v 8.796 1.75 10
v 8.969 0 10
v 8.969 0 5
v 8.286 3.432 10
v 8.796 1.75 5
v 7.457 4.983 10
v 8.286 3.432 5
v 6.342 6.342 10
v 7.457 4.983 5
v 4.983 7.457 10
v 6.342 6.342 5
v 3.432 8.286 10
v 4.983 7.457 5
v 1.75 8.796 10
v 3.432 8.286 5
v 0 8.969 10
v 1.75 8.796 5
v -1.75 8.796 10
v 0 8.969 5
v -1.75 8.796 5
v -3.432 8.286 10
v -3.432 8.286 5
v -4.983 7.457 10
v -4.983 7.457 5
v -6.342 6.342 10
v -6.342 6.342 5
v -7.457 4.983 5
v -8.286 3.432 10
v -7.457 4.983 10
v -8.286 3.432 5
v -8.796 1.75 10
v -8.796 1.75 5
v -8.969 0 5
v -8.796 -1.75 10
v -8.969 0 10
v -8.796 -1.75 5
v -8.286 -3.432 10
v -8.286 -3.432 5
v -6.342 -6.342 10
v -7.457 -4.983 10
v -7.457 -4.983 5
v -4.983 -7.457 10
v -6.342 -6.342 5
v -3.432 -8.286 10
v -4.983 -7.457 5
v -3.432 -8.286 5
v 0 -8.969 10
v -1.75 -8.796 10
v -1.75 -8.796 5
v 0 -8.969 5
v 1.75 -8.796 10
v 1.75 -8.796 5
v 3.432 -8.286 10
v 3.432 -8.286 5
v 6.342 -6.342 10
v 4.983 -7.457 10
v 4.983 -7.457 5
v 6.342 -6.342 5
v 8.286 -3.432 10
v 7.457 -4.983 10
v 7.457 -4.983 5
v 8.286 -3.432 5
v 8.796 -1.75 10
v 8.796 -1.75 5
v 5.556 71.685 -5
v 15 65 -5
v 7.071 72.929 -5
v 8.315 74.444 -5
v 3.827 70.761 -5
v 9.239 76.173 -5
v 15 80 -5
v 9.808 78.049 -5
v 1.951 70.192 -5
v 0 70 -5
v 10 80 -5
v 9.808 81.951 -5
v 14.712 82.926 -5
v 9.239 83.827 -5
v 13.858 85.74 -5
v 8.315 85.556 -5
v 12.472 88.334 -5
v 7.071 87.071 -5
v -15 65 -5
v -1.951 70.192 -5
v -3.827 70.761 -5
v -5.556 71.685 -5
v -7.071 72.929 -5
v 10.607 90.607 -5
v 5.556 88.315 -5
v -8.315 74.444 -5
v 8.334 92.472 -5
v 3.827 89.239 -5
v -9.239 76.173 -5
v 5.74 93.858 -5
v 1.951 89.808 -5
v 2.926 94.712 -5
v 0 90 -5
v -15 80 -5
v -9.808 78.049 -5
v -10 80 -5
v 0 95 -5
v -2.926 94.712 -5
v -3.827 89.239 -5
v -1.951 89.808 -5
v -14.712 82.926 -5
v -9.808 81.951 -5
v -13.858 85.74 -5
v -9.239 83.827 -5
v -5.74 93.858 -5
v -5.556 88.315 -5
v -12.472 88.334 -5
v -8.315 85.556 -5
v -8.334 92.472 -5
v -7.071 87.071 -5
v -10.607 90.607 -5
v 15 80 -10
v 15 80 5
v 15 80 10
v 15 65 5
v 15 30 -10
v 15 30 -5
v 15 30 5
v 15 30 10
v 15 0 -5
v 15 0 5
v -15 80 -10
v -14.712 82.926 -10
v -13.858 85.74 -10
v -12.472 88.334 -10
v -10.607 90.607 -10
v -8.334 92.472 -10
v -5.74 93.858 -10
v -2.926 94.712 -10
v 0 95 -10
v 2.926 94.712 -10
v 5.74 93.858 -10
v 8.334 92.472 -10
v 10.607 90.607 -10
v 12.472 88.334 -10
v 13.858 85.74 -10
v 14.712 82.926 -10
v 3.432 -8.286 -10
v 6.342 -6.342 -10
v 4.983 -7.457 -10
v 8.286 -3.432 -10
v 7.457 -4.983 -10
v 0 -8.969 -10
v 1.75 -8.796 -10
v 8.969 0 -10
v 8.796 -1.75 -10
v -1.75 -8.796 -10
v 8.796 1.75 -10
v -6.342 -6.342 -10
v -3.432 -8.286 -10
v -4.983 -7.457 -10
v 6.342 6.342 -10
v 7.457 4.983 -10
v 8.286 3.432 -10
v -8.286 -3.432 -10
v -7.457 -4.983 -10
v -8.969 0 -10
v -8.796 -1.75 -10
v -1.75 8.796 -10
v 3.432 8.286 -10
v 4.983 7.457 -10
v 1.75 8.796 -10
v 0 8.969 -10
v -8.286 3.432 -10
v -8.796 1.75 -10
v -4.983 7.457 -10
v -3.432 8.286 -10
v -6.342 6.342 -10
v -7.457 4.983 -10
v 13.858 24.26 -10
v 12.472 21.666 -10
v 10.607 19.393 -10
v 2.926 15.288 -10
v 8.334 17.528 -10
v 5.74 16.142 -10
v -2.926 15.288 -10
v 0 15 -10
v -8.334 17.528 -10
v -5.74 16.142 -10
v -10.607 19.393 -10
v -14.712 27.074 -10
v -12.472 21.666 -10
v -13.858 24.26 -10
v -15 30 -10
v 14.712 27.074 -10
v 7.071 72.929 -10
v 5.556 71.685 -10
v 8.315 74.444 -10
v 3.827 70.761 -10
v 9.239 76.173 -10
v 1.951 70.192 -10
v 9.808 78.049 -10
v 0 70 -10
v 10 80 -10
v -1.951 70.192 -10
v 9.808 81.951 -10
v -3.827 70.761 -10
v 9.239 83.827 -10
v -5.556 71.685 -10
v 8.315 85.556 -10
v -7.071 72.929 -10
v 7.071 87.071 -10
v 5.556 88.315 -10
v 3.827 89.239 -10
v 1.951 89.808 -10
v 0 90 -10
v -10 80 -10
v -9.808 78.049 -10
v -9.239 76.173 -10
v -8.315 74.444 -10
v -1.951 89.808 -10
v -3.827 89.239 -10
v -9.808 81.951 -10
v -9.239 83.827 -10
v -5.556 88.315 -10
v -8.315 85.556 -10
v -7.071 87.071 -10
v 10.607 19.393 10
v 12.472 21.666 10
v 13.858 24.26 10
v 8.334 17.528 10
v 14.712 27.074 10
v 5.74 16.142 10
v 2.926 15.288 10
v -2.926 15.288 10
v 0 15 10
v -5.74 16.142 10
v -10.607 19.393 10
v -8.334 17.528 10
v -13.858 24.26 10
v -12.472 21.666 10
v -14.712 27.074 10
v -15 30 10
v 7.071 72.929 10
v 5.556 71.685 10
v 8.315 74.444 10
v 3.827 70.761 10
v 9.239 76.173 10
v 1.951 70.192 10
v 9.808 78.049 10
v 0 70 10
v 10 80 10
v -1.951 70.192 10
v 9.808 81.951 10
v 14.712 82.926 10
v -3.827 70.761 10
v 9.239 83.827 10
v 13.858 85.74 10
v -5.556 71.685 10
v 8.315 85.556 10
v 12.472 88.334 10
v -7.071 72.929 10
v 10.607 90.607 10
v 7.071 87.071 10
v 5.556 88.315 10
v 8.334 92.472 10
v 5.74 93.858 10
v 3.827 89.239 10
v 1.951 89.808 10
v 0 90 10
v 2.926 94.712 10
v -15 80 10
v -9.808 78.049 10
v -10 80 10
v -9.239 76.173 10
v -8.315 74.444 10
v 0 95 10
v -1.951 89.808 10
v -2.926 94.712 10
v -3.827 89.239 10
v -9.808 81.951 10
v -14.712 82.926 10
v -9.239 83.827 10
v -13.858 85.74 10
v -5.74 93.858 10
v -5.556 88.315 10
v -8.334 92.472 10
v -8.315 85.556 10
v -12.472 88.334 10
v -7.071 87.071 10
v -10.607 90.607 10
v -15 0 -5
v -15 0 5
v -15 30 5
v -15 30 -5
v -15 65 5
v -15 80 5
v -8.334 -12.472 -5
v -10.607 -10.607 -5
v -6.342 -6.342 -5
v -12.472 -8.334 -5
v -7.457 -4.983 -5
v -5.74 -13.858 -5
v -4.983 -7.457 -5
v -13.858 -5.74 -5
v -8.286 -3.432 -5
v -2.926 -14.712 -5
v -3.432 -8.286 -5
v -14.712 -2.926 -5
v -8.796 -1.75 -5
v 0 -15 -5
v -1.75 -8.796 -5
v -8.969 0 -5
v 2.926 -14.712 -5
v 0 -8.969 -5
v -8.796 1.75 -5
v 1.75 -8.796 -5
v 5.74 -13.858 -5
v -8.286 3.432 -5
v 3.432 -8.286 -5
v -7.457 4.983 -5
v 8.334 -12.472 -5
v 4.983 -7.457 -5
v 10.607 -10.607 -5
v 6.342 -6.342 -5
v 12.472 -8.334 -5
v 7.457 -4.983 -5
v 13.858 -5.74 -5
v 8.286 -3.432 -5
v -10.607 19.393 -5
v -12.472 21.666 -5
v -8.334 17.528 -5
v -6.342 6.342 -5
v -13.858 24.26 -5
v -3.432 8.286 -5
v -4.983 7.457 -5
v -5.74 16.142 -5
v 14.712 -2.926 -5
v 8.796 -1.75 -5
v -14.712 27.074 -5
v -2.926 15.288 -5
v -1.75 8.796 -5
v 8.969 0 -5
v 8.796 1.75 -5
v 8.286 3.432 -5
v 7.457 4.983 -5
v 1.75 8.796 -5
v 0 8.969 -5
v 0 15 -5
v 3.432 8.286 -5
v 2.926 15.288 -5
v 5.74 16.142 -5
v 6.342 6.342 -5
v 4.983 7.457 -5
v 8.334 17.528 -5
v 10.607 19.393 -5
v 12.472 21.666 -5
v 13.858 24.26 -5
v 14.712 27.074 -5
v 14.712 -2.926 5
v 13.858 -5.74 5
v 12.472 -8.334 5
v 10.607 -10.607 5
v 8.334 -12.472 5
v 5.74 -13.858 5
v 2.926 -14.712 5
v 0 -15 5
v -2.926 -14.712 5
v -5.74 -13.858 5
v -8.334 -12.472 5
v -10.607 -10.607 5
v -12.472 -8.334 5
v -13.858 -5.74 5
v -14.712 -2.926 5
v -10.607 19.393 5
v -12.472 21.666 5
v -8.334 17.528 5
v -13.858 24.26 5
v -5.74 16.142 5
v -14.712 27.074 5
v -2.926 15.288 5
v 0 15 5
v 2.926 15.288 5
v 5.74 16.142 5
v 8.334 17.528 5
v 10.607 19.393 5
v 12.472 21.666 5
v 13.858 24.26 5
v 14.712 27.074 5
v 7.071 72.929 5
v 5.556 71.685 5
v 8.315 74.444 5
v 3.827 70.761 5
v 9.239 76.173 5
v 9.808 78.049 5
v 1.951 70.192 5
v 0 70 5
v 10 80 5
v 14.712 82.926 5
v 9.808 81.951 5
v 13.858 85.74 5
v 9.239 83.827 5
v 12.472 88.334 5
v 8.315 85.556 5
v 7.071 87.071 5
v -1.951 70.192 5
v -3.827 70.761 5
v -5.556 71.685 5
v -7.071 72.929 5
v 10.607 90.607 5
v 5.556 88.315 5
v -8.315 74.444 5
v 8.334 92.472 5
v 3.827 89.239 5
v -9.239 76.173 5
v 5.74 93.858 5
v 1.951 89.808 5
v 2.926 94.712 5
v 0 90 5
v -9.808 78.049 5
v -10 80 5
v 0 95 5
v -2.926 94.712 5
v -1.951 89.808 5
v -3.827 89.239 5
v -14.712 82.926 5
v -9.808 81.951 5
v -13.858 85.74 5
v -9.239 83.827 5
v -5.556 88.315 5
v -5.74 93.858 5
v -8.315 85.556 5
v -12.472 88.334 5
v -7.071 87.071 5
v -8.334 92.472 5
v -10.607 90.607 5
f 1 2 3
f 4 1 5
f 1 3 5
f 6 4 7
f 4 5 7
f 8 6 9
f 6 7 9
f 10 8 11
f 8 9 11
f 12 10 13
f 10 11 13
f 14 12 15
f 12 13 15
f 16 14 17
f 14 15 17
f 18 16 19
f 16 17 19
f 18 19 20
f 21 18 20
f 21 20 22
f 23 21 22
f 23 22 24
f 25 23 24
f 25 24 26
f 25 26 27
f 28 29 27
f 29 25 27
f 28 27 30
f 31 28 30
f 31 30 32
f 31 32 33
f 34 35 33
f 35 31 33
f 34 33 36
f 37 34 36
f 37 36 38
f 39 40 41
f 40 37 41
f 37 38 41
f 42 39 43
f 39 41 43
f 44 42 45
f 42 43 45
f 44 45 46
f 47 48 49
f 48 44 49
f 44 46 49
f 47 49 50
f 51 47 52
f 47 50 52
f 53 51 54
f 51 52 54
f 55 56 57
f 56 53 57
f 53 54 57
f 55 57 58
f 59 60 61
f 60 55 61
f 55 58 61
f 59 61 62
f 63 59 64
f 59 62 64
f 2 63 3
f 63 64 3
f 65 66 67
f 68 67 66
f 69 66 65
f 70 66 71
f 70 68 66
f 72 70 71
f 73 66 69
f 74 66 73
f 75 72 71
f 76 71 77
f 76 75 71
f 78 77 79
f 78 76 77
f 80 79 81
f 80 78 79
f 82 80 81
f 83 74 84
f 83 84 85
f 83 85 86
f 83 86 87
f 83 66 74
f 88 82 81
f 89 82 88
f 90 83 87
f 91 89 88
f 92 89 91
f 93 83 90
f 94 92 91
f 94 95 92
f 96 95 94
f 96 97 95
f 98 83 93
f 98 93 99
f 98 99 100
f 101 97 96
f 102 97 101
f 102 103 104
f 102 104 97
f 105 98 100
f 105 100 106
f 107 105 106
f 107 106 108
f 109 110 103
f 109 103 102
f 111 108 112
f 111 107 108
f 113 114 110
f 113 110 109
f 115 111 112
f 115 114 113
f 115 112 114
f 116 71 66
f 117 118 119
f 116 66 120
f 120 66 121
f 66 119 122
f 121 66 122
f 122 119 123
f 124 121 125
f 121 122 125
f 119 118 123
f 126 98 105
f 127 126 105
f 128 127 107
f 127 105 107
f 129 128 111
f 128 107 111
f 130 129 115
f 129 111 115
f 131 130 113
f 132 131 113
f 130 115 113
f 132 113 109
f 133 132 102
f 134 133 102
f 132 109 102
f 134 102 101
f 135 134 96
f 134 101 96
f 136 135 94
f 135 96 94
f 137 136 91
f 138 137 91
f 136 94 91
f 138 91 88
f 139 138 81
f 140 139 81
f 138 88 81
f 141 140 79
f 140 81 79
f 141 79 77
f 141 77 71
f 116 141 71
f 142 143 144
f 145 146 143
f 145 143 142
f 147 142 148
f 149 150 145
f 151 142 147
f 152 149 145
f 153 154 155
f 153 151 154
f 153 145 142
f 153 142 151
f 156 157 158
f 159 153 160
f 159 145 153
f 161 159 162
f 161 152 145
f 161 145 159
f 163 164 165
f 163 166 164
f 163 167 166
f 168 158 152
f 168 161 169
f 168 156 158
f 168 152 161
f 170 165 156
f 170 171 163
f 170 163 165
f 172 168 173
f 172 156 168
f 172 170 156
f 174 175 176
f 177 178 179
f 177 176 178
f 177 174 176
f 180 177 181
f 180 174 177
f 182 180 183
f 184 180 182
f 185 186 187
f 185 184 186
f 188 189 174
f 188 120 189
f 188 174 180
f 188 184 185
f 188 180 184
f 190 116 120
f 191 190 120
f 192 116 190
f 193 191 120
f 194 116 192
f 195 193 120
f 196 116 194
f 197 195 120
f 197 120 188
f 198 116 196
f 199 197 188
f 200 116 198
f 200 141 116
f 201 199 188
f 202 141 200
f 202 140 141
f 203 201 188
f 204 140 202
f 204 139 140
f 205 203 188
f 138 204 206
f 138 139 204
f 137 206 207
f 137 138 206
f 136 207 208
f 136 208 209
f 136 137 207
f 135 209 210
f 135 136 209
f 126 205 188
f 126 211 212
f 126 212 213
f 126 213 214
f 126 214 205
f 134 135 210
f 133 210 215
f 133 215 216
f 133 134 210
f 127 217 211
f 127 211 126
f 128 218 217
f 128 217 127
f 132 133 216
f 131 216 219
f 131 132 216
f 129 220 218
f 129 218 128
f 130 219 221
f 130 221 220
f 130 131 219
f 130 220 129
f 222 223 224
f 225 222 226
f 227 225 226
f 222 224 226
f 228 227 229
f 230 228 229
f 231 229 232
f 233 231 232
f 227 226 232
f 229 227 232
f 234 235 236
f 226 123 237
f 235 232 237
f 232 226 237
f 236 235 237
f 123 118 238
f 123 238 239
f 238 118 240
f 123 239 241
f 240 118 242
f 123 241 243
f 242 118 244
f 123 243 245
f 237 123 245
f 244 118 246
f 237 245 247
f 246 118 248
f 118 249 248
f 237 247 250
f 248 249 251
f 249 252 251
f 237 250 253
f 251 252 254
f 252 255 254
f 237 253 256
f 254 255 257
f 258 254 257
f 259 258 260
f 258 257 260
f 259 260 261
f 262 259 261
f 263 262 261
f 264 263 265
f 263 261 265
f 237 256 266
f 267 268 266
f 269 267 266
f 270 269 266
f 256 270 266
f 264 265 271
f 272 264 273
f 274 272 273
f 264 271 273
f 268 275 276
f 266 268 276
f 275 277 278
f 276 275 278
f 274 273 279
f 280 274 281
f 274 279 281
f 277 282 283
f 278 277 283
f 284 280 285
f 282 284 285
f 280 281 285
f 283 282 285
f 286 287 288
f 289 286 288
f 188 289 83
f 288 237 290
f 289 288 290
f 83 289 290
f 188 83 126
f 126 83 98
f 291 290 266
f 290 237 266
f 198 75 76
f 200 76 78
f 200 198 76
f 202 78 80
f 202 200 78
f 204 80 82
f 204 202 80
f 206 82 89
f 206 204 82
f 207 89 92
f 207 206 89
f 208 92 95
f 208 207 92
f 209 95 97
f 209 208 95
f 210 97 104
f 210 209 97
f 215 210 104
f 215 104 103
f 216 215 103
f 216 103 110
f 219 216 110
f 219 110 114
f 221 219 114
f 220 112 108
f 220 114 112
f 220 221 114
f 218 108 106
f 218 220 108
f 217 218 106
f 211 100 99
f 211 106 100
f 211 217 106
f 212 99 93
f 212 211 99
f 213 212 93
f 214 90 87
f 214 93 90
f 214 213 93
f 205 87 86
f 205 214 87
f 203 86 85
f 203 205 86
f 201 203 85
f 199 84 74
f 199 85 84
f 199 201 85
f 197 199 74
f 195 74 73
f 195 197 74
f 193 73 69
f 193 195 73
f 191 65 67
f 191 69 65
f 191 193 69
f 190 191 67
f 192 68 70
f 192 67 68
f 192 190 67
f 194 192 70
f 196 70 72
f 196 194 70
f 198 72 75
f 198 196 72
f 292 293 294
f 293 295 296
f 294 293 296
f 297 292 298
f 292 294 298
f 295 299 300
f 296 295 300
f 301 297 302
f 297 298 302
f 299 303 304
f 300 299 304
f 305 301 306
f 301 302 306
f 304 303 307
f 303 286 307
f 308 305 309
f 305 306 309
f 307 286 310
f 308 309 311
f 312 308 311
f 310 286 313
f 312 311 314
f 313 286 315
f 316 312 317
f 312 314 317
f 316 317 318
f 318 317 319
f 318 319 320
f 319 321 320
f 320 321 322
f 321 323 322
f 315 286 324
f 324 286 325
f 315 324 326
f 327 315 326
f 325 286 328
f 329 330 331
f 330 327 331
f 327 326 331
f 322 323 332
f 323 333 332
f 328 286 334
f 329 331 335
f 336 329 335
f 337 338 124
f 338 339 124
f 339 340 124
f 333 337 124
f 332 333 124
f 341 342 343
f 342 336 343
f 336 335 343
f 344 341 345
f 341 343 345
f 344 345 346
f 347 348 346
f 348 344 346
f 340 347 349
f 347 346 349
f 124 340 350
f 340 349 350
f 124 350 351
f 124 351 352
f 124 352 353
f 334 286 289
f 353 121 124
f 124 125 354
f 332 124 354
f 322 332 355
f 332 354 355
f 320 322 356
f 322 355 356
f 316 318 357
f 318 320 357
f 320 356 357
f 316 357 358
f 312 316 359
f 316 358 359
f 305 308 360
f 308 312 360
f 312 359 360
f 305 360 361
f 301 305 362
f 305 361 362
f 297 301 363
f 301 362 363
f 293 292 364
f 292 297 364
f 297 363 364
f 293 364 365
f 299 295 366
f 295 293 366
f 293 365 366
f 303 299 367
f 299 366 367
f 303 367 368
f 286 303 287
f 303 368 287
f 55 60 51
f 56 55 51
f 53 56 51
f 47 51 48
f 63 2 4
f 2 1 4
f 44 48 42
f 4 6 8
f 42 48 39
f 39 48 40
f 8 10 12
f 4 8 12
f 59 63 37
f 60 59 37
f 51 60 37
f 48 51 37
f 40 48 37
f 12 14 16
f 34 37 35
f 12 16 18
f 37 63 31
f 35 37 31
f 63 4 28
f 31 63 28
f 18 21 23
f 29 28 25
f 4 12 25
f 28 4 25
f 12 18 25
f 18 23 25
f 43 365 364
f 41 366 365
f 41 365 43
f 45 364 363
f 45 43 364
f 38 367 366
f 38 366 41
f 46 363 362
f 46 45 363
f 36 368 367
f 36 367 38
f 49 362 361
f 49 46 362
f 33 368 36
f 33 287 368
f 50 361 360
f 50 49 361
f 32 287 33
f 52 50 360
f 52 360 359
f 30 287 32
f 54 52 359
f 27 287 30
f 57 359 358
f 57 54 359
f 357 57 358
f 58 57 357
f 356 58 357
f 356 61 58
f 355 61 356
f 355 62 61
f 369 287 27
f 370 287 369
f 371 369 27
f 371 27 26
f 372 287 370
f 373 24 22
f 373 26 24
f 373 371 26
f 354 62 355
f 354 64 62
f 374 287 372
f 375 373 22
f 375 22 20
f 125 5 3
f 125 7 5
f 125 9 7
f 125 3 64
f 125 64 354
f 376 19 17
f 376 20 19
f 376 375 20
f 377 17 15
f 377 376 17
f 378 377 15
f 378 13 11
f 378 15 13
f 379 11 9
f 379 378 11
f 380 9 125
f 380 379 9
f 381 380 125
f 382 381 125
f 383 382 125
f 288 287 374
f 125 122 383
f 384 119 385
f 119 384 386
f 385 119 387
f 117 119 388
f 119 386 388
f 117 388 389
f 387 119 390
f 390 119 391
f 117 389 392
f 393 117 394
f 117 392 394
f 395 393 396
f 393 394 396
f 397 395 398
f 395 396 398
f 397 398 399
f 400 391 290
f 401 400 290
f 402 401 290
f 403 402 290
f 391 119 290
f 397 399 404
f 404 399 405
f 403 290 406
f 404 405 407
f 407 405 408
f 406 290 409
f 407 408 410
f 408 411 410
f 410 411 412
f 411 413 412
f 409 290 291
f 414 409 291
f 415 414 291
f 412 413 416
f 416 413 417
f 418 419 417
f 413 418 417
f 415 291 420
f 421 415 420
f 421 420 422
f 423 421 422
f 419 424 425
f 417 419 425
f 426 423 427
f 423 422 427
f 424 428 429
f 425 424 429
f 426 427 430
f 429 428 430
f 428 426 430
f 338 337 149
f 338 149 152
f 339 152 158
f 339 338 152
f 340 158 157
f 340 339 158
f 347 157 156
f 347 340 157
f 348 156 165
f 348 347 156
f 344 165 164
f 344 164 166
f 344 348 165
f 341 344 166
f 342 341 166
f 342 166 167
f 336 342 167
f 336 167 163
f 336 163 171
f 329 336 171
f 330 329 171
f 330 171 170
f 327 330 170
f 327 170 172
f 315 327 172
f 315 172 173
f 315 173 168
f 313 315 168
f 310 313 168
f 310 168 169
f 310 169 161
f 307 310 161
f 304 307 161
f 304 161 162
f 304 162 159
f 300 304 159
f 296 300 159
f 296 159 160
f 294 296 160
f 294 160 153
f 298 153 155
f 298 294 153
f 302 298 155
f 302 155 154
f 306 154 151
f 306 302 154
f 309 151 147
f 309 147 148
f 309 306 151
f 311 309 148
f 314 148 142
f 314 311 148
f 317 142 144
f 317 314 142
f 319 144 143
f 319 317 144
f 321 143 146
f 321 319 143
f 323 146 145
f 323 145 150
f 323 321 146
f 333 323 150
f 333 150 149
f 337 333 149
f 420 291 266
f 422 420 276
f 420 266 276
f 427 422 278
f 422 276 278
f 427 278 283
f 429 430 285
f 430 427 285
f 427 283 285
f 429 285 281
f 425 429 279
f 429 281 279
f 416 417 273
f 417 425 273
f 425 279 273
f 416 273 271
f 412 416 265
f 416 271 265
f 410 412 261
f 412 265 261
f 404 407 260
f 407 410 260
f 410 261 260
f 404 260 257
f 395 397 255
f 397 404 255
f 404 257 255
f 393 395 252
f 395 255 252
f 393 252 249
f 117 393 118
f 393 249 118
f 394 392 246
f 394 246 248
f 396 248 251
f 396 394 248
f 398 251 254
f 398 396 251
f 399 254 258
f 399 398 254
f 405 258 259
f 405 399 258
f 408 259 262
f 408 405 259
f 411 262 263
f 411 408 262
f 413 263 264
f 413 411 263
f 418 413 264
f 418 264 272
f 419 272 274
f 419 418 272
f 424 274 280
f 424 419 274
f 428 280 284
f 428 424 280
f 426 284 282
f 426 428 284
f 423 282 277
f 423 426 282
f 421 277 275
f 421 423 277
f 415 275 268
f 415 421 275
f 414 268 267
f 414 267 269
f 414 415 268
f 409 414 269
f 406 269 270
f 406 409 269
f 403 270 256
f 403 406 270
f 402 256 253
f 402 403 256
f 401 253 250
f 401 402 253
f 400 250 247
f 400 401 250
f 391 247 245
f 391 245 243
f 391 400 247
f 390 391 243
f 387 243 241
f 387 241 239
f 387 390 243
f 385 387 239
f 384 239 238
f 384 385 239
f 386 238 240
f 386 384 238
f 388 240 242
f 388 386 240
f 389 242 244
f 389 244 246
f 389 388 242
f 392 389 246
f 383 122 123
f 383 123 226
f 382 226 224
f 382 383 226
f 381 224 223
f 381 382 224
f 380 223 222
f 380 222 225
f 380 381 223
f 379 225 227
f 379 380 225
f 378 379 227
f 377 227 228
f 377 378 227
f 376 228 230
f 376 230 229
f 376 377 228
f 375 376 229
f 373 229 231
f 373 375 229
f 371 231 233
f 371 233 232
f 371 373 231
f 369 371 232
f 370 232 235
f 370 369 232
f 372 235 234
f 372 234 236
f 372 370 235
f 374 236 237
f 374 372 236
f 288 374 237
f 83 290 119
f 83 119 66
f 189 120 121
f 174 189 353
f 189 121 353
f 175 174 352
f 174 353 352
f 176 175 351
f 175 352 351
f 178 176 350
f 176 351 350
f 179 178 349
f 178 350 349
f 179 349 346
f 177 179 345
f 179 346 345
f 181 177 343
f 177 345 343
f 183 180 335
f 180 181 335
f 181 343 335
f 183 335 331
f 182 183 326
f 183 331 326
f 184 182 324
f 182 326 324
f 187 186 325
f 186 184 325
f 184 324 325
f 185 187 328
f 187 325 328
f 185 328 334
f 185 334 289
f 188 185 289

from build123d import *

# Parameters (mm, degrees)
CROQUIS1_R                 = 10
SALIENTE_EXTRUIR1_DEPTH    = 10
CORTAR_EXTRUIR2_DEPTH      = 97.695398029
CORTAR_EXTRUIR2_DEPTH_BACK = 97.695398029
CROQUIS2_W                 = 10
CROQUIS2_H                 = 30
CORTAR_EXTRUIR4_START      = -5
CROQUIS4_R                 = 8.968507367
CORTAR_EXTRUIR4_DEPTH      = 92.695398029
CORTAR_EXTRUIR6_START      = 5
CROQUIS4_2_R               = 8.968507367
CORTAR_EXTRUIR6_DEPTH      = 92.695398029


with BuildPart() as part:
    # Croquis1 → Saliente-Extruir1 (new, symmetric)
    with BuildSketch(Plane.XY):
        with BuildLine():
            Line((-15, 0), (-15, 80))
            ThreePointArc((-15, 80), (0, 95), (15, 80))
            Line((15, 80), (15, 0))
            ThreePointArc((15, 0), (0, -15), (-15, 0))
        make_face()
        with Locations((0, 80)):
            Circle(CROQUIS1_R, mode=Mode.SUBTRACT)
    extrude(amount=SALIENTE_EXTRUIR1_DEPTH, both=True)

    # Croquis2 → Cortar-Extruir2 (cut, two sides: drawn at the far end of the back side and taken through both)
    with BuildSketch(Plane(origin=(0, 0, 0), x_dir=(0, 0, -1), z_dir=(1, 0, 0)).offset(-CORTAR_EXTRUIR2_DEPTH_BACK)):
        with Locations((0, 80)):
            Rectangle(CROQUIS2_W, CROQUIS2_H)
    extrude(amount=CORTAR_EXTRUIR2_DEPTH + CORTAR_EXTRUIR2_DEPTH_BACK, mode=Mode.SUBTRACT)

    # Croquis4 → Cortar-Extruir4 (cut, through all)
    with BuildSketch(Plane.XY.offset(CORTAR_EXTRUIR4_START)):
        with BuildLine():
            Line((-15, 30), (-15, 0))
            ThreePointArc((-15, 0), (0, -15), (15, 0))
            Line((15, 0), (15, 30))
            ThreePointArc((15, 30), (0, 15), (-15, 30))
        make_face()
        Circle(CROQUIS4_R, mode=Mode.SUBTRACT)
    extrude(amount=-CORTAR_EXTRUIR4_DEPTH, mode=Mode.SUBTRACT)

    # Croquis4<2> → Cortar-Extruir6 (cut, through all)
    with BuildSketch(Plane.XY.offset(CORTAR_EXTRUIR6_START)):
        with BuildLine():
            Line((-15, 30), (-15, 0))
            ThreePointArc((-15, 0), (0, -15), (15, 0))
            Line((15, 0), (15, 30))
            ThreePointArc((15, 30), (0, 15), (-15, 30))
        make_face()
        Circle(CROQUIS4_2_R, mode=Mode.SUBTRACT)
    extrude(amount=CORTAR_EXTRUIR6_DEPTH, mode=Mode.SUBTRACT)


solid = part.part
